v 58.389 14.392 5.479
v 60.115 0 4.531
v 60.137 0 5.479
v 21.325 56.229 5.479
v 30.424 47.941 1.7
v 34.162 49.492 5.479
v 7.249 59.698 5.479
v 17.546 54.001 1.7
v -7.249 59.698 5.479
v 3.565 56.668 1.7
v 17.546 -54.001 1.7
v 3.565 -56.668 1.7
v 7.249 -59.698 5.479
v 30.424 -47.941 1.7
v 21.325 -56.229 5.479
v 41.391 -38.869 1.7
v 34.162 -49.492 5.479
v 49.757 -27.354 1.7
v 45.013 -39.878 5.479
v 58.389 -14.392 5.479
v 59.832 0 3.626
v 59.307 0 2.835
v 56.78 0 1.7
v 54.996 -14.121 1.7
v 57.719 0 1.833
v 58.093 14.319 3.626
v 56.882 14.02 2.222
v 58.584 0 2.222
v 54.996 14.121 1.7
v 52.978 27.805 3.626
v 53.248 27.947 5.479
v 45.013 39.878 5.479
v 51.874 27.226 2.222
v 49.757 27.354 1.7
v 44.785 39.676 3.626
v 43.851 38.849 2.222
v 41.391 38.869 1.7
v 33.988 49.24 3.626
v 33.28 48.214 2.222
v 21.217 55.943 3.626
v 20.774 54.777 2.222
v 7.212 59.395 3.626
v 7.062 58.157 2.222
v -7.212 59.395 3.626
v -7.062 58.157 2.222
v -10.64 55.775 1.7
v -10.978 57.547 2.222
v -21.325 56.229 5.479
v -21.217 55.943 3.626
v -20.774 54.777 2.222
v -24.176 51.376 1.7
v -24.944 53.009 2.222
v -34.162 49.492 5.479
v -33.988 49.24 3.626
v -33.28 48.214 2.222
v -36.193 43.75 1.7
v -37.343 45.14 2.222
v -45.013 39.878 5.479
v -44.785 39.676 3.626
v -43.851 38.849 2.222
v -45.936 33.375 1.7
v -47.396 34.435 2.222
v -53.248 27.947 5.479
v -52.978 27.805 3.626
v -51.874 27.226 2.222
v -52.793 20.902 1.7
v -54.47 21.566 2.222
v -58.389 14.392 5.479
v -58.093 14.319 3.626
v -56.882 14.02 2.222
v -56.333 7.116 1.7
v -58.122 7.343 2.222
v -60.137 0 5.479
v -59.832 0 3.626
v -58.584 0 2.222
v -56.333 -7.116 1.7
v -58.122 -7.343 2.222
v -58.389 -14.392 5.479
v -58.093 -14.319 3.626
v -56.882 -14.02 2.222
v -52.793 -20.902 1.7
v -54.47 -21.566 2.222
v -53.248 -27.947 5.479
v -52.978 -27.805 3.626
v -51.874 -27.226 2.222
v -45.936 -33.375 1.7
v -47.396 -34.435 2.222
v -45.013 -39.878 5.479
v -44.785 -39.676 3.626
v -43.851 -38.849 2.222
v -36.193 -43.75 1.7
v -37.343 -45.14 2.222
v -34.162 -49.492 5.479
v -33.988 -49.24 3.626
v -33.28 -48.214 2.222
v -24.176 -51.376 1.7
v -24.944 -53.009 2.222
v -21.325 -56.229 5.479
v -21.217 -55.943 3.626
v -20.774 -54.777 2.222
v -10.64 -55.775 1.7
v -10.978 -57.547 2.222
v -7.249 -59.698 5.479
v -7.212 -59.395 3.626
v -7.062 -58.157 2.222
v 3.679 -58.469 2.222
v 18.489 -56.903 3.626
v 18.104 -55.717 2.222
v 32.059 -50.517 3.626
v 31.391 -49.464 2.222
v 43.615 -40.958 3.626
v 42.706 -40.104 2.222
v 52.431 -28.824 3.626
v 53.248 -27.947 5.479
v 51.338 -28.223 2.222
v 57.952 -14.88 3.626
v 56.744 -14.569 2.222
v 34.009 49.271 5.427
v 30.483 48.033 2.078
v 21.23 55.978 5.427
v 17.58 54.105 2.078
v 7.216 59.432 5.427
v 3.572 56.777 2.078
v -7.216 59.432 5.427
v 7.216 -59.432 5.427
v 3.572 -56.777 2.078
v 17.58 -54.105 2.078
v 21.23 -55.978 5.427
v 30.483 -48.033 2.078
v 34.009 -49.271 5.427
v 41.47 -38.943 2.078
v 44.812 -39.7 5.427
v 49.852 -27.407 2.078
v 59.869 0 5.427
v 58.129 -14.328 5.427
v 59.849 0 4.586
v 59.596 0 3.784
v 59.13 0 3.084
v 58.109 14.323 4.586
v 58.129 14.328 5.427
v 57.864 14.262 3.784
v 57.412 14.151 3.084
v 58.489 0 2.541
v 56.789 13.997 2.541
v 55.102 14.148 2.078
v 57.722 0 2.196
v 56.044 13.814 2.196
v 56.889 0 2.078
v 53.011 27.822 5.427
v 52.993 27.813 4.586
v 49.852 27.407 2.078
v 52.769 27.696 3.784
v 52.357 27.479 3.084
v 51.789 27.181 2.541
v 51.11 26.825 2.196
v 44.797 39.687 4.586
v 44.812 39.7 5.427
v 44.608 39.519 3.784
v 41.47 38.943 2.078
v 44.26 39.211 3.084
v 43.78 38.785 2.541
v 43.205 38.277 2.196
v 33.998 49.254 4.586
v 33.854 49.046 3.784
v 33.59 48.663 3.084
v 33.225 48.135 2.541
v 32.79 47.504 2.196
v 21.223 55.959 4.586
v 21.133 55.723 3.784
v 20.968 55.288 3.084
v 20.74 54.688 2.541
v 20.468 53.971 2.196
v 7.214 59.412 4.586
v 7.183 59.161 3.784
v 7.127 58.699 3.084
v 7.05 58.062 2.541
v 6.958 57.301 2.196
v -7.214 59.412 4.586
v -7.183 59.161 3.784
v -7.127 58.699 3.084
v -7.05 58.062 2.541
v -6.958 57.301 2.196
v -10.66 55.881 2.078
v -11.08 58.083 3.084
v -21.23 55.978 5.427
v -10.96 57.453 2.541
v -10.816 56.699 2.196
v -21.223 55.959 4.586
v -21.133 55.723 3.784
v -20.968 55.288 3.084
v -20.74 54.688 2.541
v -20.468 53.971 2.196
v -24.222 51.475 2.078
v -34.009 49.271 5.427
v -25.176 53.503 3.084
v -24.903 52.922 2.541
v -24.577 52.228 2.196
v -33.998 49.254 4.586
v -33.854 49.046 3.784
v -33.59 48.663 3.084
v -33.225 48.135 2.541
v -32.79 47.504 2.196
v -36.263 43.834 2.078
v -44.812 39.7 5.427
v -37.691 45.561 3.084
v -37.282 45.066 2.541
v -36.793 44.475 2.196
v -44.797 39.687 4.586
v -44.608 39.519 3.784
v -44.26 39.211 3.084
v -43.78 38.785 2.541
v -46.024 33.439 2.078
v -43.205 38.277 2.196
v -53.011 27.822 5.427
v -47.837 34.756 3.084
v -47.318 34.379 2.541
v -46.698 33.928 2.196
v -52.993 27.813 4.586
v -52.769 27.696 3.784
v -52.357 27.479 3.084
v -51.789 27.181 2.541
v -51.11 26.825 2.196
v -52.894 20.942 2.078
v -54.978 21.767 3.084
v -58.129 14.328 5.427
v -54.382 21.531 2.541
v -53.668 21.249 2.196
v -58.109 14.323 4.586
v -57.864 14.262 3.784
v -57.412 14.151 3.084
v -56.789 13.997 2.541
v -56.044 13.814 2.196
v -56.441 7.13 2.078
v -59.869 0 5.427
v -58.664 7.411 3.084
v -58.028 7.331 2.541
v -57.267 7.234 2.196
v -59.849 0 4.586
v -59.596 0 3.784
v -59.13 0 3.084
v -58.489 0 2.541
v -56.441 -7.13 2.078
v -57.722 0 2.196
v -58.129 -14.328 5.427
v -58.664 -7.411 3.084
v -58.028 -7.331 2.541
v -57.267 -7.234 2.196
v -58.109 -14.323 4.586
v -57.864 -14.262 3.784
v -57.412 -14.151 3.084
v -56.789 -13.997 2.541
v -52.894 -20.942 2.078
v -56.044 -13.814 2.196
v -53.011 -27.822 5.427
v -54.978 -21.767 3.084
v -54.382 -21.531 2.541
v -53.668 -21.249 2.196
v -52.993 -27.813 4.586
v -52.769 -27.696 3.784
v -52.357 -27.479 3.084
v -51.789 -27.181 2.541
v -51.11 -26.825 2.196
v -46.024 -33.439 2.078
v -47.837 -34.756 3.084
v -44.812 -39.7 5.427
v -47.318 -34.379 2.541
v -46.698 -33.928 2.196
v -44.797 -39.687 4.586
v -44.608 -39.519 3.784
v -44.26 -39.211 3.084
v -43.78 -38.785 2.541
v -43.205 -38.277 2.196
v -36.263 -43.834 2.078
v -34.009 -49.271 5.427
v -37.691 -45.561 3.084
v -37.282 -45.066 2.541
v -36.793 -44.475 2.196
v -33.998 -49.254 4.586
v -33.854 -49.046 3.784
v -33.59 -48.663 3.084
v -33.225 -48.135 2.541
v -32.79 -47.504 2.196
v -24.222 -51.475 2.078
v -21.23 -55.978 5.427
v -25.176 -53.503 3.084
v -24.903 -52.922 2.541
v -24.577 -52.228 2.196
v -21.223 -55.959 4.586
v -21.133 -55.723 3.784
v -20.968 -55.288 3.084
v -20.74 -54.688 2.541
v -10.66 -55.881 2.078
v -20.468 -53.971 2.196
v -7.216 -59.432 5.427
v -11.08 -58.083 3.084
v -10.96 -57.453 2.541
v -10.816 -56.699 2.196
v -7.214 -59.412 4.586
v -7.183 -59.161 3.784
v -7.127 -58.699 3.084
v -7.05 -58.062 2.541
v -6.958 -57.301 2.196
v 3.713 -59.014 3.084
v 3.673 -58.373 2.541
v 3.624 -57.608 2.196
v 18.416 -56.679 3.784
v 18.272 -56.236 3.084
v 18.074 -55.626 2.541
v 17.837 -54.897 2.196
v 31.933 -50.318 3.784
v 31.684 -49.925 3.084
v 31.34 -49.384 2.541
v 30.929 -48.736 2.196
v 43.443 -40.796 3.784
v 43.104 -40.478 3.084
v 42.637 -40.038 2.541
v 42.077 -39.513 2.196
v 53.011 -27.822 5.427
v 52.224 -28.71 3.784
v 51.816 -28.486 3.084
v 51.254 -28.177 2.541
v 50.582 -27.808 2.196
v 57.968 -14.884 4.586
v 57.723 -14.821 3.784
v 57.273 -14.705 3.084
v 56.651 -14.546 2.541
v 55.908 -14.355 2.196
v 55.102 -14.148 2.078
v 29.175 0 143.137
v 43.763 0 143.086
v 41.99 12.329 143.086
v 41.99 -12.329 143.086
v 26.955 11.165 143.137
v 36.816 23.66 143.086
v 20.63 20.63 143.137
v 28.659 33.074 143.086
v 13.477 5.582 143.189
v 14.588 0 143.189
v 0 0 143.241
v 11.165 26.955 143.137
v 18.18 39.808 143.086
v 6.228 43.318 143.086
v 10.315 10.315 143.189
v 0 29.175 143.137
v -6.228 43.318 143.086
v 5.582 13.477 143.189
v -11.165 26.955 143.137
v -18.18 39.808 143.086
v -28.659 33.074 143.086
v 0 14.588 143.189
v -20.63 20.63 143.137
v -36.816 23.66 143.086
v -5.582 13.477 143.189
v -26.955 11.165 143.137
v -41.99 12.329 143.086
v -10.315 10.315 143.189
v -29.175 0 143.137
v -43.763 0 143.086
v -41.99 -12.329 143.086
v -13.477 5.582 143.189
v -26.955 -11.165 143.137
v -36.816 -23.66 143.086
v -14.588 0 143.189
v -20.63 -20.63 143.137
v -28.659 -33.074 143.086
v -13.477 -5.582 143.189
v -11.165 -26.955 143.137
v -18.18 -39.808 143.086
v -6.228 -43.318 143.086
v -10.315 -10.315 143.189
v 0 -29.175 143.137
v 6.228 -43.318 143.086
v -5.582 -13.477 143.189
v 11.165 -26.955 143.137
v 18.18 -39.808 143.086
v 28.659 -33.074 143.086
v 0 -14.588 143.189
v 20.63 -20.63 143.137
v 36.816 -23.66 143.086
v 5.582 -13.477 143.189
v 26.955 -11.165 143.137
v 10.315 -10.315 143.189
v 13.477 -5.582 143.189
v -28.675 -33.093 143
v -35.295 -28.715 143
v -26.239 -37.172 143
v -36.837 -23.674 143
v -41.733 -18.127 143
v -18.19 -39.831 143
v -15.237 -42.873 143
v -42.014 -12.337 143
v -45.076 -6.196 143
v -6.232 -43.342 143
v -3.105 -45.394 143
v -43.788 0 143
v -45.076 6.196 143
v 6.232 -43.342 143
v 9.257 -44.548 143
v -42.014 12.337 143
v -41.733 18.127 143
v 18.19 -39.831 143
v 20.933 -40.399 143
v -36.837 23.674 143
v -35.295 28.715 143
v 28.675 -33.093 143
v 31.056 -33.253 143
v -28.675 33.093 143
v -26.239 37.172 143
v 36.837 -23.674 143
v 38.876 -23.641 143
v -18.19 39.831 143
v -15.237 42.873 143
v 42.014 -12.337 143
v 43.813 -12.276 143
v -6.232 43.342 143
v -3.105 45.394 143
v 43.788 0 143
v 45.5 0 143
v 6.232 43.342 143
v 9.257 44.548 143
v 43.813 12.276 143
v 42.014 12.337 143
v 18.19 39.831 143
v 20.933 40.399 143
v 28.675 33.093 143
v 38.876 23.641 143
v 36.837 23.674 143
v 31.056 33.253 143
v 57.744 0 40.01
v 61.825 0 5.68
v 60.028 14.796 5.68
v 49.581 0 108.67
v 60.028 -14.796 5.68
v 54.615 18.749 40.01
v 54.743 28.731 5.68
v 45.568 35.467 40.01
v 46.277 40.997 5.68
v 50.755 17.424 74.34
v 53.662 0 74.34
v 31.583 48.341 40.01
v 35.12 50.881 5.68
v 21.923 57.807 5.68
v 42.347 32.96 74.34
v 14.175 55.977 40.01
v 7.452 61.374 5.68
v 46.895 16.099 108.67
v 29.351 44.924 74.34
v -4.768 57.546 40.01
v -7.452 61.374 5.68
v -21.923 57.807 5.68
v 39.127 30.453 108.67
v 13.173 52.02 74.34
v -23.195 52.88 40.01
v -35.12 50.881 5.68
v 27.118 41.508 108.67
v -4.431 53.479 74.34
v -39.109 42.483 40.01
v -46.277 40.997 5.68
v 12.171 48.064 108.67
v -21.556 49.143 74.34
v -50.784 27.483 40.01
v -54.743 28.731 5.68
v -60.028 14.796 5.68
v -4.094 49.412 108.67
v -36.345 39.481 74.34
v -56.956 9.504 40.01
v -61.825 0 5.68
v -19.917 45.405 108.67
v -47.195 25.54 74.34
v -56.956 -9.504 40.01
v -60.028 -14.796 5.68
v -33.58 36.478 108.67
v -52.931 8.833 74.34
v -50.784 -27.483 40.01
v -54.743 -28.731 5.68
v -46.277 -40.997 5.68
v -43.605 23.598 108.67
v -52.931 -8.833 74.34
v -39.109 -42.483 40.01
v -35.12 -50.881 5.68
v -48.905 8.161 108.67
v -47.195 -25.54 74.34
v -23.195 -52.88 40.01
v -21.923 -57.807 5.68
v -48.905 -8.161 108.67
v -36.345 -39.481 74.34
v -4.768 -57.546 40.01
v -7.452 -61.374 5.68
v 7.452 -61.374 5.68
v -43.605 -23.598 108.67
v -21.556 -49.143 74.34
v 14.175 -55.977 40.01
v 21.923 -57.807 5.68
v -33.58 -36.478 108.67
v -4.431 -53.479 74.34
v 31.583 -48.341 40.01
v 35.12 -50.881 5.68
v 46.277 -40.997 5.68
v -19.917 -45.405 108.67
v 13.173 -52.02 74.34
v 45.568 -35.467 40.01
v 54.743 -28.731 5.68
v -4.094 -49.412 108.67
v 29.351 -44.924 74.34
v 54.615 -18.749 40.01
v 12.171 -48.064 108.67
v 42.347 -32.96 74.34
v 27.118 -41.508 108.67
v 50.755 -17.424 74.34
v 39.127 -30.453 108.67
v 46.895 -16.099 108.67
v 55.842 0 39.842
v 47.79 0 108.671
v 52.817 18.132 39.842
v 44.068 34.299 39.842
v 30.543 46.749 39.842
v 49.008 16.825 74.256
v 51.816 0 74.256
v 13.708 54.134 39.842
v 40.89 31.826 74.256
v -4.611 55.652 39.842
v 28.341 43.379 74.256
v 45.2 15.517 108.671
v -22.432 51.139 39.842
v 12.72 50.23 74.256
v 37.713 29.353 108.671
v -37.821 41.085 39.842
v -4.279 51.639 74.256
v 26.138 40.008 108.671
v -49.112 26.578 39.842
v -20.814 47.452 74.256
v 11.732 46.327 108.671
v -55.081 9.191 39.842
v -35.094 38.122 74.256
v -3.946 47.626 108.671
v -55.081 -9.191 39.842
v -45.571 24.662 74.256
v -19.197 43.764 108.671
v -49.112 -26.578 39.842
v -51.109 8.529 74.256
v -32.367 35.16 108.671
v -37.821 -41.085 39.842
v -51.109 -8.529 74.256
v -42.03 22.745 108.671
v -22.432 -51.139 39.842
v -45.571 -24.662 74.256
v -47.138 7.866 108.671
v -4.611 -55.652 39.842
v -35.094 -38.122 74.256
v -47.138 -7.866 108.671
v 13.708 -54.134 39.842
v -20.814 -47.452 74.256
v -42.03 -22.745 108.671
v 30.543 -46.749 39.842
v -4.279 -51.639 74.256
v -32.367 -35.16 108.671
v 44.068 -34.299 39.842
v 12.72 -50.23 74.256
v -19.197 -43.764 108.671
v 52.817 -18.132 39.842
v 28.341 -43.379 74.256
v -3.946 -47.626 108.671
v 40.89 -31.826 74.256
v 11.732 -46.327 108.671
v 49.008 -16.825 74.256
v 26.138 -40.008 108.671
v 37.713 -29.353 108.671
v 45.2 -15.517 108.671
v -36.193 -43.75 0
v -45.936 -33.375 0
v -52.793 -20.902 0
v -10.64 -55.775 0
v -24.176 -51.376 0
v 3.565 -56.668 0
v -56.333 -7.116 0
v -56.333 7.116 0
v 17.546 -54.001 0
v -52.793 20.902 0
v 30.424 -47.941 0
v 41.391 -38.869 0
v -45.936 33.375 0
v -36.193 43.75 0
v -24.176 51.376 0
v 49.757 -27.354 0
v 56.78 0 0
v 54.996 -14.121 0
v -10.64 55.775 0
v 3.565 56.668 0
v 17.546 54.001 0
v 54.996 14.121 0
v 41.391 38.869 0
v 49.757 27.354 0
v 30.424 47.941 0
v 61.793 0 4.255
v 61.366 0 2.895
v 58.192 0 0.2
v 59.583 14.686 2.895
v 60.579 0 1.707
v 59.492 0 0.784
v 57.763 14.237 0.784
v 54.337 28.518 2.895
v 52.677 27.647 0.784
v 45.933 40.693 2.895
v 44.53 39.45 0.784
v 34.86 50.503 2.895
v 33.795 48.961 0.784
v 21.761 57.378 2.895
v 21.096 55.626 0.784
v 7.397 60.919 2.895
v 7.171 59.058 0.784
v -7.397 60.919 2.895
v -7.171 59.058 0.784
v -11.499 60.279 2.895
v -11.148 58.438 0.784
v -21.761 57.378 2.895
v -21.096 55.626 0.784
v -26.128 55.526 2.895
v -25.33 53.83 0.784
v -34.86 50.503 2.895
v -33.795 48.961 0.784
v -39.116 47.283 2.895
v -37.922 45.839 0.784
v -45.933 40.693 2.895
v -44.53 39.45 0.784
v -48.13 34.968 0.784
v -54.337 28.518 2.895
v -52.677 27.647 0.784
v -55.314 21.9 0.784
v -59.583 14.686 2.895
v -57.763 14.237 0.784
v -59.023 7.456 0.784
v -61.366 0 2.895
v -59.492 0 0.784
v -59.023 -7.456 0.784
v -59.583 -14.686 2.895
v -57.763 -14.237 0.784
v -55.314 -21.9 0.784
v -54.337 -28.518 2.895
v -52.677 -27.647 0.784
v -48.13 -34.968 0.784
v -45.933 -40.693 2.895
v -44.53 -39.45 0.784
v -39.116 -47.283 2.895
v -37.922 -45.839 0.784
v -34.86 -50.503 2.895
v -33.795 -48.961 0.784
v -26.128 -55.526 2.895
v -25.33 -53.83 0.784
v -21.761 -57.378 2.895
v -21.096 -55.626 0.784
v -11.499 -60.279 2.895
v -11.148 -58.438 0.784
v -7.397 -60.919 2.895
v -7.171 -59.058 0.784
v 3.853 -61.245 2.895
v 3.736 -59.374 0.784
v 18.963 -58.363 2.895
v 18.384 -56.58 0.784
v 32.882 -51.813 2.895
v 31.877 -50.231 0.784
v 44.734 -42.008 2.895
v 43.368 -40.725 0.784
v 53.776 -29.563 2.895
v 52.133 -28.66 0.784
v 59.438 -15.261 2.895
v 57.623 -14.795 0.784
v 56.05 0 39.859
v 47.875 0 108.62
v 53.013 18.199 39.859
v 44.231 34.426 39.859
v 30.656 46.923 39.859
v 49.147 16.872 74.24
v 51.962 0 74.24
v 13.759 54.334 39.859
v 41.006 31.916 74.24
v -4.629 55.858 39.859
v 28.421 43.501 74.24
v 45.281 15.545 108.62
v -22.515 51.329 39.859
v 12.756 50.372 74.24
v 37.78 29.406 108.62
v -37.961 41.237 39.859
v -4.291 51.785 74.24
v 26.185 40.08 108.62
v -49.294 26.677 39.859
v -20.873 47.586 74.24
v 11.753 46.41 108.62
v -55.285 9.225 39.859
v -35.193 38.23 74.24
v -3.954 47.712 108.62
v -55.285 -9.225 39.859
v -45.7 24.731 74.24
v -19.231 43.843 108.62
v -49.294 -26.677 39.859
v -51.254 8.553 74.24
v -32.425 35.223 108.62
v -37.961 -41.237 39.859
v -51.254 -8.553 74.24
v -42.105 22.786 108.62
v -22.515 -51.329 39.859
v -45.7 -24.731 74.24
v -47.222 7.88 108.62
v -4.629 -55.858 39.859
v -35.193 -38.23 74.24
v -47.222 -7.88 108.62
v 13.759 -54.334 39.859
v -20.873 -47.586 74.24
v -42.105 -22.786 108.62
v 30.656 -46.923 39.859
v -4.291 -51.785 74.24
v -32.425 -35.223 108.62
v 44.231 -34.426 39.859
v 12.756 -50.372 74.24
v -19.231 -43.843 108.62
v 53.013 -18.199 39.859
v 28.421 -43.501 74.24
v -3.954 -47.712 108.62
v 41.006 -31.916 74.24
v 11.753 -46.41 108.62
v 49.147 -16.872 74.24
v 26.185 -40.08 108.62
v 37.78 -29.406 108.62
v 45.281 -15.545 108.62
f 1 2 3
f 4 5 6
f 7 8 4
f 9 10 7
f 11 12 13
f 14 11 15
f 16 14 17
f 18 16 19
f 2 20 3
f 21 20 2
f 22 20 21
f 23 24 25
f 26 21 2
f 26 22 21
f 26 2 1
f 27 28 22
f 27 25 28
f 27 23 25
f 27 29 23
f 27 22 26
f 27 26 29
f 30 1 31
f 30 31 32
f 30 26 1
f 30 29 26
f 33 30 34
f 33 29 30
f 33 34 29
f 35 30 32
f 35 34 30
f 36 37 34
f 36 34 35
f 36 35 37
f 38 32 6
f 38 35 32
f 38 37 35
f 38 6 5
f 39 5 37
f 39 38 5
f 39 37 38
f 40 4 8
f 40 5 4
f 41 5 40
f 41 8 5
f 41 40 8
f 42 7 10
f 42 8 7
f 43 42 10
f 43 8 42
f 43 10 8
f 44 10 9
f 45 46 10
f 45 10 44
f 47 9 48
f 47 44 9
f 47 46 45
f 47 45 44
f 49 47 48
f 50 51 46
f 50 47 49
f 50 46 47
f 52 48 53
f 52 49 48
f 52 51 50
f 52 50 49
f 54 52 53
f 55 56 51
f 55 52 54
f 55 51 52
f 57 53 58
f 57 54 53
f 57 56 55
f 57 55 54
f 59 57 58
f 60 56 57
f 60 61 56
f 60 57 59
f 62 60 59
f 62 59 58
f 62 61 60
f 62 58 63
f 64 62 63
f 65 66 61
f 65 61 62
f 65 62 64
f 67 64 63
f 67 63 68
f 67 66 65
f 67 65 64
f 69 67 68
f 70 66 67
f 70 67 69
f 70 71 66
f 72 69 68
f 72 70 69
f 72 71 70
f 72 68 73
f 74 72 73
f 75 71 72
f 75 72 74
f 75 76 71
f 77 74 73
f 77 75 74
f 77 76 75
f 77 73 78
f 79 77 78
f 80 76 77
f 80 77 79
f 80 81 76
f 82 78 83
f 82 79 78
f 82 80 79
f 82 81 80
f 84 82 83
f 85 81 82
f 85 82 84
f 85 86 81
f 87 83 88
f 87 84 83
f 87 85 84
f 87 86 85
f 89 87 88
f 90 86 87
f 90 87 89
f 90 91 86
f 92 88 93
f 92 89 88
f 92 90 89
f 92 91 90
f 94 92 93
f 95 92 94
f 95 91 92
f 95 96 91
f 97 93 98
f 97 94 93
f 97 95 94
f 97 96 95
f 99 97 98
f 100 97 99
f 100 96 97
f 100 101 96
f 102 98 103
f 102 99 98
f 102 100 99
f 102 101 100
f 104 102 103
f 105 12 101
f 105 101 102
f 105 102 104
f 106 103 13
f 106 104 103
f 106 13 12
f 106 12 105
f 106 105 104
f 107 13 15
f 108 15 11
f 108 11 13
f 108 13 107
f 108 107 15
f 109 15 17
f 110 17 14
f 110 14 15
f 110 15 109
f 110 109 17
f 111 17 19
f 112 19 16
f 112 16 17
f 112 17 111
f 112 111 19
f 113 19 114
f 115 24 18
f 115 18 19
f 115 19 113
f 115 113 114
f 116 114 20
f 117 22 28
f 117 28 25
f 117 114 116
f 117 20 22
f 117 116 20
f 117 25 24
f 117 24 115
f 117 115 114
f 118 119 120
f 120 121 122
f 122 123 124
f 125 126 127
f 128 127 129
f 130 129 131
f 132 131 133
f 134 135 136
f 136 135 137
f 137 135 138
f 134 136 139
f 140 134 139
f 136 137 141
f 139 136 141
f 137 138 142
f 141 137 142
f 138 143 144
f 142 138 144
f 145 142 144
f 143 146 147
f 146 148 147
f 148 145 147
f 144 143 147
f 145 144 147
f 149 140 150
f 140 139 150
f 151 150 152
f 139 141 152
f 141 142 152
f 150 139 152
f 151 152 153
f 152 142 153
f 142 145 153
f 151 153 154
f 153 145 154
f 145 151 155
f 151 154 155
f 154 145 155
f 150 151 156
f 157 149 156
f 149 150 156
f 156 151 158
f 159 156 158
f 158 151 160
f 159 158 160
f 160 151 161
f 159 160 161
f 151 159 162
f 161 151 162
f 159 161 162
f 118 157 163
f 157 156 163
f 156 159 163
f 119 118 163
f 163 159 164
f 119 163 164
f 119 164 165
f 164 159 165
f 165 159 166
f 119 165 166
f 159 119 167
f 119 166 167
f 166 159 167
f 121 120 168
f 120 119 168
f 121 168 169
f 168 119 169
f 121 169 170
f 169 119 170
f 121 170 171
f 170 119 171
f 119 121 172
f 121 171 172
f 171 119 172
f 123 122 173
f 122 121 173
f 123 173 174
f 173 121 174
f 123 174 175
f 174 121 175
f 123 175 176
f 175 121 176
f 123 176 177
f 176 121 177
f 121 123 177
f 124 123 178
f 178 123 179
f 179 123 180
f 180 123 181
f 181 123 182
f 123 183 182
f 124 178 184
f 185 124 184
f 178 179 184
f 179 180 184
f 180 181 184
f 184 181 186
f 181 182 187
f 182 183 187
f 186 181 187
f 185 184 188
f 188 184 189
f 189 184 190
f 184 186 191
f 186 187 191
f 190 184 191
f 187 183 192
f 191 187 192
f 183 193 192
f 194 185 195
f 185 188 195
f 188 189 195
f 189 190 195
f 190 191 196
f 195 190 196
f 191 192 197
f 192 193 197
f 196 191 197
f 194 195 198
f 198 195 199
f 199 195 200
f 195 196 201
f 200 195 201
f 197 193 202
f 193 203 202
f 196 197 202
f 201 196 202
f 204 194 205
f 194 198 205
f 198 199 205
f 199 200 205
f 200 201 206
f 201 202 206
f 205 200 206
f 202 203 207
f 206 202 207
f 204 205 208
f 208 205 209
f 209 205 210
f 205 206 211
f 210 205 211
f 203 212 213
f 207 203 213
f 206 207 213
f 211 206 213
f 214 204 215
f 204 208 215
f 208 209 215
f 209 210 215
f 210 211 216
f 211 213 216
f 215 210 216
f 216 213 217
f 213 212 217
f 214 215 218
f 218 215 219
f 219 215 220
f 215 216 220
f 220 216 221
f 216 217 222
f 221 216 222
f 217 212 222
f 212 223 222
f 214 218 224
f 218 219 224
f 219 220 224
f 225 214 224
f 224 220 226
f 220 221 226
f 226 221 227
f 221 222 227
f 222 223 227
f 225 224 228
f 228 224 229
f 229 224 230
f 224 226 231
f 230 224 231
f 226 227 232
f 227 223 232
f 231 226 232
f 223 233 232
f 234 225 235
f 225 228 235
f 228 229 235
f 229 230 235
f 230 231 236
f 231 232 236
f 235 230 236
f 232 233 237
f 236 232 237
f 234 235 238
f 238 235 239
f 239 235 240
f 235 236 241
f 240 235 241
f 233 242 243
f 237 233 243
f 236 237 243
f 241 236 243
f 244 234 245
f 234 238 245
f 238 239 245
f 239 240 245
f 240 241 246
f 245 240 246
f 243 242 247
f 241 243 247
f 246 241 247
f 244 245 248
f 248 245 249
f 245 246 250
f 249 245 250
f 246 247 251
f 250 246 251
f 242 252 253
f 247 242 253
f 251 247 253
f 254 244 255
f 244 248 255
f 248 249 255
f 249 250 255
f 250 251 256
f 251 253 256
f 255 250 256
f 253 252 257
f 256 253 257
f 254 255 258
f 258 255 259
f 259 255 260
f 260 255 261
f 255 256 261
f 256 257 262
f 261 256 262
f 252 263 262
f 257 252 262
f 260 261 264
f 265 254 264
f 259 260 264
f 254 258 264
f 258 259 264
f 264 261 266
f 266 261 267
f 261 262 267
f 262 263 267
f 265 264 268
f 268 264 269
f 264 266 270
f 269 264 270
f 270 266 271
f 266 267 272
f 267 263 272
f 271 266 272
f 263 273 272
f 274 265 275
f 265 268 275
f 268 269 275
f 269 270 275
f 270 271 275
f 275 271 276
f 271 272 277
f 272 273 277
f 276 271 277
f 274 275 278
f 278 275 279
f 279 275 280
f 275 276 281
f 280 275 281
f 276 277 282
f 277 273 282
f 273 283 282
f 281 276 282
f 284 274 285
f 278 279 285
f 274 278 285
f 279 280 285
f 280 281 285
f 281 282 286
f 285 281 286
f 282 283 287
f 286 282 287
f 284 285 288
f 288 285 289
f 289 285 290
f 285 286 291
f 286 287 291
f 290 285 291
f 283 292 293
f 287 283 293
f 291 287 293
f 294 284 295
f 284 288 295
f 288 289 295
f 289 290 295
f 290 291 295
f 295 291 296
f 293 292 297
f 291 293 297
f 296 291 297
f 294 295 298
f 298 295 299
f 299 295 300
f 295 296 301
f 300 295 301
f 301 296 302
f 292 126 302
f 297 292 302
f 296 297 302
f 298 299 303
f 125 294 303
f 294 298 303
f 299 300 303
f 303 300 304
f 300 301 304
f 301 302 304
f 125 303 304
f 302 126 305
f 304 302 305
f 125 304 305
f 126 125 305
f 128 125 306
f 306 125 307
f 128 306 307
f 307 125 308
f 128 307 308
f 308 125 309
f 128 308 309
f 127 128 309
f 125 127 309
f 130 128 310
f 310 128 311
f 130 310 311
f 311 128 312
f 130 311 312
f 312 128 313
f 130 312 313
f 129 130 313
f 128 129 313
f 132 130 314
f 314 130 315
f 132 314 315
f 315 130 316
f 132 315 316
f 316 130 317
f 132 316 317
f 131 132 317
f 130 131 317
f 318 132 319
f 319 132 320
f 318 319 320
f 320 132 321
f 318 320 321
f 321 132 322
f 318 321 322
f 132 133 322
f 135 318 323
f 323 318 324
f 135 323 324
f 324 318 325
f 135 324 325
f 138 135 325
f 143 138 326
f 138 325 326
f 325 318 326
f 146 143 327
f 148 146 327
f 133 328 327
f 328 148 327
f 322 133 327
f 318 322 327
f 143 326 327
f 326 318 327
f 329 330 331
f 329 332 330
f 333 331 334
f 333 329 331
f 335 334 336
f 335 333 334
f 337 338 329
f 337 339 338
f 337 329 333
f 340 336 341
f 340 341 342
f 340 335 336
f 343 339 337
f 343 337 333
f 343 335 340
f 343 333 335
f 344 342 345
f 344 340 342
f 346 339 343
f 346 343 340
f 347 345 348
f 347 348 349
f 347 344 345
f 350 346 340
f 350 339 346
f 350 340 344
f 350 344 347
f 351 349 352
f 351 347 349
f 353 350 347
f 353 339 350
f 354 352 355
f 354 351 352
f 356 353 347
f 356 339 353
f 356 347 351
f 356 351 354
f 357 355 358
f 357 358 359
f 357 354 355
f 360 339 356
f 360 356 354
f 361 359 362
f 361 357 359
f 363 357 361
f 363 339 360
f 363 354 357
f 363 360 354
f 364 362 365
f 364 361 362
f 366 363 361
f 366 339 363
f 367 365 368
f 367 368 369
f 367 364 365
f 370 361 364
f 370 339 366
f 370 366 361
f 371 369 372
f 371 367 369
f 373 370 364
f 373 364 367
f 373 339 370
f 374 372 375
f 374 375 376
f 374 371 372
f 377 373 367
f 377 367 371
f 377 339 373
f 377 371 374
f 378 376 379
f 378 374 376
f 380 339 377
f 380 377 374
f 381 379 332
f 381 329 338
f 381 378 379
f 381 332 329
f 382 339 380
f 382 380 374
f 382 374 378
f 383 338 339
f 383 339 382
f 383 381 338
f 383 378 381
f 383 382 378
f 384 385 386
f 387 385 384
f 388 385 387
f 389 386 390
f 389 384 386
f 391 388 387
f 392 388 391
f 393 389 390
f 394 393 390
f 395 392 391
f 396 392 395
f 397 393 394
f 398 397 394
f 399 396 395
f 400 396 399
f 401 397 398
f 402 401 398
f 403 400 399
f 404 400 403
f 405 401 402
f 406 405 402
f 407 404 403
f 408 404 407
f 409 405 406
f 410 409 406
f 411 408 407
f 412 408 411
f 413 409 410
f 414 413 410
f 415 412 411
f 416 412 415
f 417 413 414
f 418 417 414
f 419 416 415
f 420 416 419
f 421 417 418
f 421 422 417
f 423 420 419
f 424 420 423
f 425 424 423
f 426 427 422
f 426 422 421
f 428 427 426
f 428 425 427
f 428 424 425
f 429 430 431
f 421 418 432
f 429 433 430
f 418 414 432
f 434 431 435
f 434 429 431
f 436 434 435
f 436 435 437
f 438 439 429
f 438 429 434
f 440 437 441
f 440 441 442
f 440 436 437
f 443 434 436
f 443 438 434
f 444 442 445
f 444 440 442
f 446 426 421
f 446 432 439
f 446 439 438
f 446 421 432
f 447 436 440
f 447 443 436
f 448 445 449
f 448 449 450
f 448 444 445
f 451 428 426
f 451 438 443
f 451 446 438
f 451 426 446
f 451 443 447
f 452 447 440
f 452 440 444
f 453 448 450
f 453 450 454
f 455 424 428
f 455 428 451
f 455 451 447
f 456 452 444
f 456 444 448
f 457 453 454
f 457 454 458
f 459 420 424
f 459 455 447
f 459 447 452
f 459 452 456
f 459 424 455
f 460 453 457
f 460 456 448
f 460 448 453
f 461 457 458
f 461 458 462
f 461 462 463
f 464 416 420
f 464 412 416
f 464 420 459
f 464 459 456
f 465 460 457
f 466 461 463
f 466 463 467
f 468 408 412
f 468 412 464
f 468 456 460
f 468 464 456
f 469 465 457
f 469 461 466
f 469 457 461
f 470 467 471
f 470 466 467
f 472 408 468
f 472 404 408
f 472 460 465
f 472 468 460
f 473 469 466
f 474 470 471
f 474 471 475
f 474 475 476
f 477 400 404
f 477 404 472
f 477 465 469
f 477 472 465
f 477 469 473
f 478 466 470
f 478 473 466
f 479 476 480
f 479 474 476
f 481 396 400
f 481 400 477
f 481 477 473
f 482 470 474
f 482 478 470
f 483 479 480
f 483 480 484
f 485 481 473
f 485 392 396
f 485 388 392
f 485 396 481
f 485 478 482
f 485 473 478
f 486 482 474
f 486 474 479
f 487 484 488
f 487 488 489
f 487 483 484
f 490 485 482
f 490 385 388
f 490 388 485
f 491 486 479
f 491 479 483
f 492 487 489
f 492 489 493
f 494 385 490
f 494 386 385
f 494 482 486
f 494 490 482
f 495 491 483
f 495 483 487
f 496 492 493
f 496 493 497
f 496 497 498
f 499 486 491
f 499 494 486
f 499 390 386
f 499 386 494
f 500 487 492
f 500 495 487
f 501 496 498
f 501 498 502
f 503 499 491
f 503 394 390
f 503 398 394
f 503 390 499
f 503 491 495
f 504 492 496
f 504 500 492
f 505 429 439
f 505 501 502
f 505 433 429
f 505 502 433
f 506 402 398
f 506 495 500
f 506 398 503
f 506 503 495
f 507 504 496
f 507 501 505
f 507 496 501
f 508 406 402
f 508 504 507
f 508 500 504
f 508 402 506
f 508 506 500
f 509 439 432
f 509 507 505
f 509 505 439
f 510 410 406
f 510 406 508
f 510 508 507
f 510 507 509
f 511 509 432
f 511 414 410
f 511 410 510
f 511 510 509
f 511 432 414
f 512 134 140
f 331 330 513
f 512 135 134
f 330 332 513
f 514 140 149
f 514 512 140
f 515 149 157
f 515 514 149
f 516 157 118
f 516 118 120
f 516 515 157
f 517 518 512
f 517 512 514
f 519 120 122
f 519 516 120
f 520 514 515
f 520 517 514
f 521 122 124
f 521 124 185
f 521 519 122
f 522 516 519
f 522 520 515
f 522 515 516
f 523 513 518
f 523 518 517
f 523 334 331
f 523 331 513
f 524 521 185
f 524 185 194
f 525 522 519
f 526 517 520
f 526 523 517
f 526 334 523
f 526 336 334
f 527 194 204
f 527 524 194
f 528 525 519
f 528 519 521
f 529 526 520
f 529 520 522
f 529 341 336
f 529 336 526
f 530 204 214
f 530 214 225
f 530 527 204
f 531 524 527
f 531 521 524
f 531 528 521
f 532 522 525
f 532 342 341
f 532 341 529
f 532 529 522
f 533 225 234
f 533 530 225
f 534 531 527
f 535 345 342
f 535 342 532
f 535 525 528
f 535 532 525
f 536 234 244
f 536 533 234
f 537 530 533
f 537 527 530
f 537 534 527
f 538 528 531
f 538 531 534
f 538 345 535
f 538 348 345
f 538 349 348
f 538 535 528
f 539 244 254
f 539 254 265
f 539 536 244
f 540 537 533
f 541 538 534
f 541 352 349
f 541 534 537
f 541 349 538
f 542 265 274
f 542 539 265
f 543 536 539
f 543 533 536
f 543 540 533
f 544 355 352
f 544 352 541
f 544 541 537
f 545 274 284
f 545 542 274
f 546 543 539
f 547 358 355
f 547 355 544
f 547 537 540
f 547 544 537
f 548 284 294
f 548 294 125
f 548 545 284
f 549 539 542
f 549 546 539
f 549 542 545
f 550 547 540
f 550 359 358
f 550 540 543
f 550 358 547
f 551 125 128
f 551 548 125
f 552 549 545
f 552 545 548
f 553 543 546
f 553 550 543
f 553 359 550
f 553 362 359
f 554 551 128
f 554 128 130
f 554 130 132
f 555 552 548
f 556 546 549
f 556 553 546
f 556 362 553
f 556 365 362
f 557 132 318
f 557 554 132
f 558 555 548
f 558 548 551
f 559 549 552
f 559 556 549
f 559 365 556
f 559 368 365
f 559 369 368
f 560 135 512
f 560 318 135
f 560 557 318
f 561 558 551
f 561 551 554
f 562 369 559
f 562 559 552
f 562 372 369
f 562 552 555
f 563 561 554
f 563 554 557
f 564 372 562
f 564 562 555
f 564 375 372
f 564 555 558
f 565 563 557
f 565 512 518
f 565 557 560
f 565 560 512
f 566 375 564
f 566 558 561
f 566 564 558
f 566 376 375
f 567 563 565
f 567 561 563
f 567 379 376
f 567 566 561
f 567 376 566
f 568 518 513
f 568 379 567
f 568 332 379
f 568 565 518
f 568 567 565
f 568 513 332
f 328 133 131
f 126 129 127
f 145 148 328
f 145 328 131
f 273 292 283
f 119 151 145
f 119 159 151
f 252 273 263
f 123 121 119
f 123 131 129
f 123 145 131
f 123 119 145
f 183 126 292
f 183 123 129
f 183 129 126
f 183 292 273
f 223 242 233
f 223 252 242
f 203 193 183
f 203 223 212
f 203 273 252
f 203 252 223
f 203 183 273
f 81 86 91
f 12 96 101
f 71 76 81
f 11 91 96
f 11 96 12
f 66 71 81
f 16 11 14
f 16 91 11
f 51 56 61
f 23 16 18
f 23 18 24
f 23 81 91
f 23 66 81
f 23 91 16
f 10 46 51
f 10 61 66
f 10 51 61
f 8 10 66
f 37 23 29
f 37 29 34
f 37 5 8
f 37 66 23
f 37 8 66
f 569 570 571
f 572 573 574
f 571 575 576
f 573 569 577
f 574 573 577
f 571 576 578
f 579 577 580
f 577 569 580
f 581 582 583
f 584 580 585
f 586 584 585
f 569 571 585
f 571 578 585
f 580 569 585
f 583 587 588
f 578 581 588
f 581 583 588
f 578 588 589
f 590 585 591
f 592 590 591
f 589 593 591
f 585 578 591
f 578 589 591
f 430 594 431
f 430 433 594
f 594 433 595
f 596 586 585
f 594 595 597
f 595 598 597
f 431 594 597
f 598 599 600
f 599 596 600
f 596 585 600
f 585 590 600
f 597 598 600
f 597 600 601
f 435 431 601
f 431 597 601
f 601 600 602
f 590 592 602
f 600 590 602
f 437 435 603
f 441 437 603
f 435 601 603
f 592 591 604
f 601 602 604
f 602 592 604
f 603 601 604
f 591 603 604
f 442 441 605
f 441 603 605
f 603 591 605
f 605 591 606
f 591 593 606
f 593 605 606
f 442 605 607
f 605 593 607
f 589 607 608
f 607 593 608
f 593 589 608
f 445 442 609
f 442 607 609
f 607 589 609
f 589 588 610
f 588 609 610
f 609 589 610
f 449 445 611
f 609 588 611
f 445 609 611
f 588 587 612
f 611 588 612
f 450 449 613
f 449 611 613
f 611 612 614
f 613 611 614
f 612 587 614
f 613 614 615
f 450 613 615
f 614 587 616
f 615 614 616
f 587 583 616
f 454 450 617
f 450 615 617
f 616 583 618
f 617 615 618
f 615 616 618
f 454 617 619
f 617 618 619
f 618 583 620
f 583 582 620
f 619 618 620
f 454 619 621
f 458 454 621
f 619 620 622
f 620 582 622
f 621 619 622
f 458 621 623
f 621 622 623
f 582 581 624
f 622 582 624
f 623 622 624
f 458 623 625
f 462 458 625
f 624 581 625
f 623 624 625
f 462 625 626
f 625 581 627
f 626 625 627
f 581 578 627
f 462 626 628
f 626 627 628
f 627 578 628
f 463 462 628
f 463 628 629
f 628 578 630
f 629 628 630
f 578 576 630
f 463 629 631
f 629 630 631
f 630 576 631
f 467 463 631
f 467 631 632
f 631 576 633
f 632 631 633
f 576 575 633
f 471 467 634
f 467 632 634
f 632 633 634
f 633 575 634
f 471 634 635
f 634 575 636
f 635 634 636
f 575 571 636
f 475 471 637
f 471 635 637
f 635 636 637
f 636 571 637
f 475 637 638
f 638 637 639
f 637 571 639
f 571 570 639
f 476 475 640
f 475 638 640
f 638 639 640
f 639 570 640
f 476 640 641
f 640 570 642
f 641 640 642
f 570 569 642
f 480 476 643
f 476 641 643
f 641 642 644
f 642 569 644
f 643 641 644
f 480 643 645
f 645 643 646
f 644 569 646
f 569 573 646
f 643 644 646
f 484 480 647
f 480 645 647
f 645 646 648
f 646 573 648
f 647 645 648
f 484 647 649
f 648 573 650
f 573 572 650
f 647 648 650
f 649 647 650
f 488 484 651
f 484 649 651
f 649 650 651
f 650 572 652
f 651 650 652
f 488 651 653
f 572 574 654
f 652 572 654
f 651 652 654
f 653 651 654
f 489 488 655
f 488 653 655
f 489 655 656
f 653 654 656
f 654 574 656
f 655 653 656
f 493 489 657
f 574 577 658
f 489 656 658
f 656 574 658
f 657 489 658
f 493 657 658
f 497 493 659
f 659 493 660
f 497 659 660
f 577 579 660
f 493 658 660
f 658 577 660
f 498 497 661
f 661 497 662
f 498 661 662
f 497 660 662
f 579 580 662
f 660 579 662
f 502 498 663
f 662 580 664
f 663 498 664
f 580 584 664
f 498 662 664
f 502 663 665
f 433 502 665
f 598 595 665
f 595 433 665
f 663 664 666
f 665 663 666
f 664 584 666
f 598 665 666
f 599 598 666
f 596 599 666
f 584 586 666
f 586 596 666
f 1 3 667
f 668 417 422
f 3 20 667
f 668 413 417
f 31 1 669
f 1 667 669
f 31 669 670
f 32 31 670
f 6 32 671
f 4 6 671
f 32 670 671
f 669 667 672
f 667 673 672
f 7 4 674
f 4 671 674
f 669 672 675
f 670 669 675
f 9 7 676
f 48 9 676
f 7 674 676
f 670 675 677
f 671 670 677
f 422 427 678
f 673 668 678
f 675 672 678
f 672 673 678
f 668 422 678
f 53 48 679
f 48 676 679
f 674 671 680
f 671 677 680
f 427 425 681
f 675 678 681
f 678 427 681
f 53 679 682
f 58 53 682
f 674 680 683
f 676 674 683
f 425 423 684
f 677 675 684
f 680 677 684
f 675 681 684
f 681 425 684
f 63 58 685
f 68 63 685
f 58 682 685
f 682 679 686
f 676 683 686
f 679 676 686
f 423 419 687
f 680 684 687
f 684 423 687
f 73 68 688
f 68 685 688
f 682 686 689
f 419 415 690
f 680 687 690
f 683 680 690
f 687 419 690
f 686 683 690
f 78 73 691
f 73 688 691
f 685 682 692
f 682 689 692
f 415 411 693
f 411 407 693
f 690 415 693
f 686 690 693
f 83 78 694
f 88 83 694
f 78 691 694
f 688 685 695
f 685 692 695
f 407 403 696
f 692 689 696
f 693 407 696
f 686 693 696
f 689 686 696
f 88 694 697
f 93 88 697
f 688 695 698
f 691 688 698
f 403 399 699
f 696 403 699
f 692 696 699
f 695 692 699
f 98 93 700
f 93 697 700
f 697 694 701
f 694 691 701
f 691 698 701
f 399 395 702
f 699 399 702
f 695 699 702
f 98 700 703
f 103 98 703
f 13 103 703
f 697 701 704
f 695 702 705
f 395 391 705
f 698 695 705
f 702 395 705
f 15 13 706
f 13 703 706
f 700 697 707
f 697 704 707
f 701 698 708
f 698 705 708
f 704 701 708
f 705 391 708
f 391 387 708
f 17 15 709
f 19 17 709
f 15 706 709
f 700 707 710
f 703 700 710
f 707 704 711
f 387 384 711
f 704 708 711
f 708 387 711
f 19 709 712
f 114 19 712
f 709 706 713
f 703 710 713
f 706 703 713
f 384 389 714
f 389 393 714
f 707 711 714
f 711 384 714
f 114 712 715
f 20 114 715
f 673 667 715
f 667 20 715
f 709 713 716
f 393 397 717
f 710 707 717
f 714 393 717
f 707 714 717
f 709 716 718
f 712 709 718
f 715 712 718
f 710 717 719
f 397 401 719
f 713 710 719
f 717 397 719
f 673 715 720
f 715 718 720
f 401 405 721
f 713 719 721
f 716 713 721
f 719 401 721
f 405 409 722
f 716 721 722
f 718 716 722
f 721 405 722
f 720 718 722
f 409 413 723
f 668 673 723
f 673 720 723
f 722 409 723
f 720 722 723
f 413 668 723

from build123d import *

# Parameters (mm, degrees)
F0_R = 62.5
F2_R = 45.5
F4_R = 5.08
F5_T = -1.7
F8_R = 3


with BuildPart() as f3:
    # F0 (on Top) → F3 section 0
    with BuildSketch(Plane.XY):
        Circle(F0_R)
    # F2 (on offset) → F3 section 1
    with BuildSketch(Plane.XY.offset(143)):
        Circle(F2_R)
    loft()

    # F4
    f4_edges = [f3.edges().sort_by_distance(p)[0] for p in [
        (-62.5, 0, 0),
    ]]
    fillet(f4_edges, radius=F4_R)

    # F5
    f5_openings = [f3.faces().sort_by_distance(p)[0] for p in [
        (0, 0, 143),
    ]]
    offset(amount=F5_T, openings=f5_openings, kind=Kind.INTERSECTION)


with BuildPart() as f7:
    # F6 (on Front) → F7 (revolve)
    with BuildSketch(Plane.XZ):
        Polygon((60.2606162429, 2.0784155931), (43.7630936503, 143.085539341), (0, 143.2411819696), (0, 2.0784155931), align=None)
    revolve(axis=Axis((0, 0, 72.6597987814), (0, 0, 1)))

    # F8
    f8_edges = [f7.edges().sort_by_distance(p)[0] for p in [
        (-60.260616, 0, 2.078416),
    ]]
    fillet(f8_edges, radius=F8_R)


solid = Compound([f3.part, f7.part])
